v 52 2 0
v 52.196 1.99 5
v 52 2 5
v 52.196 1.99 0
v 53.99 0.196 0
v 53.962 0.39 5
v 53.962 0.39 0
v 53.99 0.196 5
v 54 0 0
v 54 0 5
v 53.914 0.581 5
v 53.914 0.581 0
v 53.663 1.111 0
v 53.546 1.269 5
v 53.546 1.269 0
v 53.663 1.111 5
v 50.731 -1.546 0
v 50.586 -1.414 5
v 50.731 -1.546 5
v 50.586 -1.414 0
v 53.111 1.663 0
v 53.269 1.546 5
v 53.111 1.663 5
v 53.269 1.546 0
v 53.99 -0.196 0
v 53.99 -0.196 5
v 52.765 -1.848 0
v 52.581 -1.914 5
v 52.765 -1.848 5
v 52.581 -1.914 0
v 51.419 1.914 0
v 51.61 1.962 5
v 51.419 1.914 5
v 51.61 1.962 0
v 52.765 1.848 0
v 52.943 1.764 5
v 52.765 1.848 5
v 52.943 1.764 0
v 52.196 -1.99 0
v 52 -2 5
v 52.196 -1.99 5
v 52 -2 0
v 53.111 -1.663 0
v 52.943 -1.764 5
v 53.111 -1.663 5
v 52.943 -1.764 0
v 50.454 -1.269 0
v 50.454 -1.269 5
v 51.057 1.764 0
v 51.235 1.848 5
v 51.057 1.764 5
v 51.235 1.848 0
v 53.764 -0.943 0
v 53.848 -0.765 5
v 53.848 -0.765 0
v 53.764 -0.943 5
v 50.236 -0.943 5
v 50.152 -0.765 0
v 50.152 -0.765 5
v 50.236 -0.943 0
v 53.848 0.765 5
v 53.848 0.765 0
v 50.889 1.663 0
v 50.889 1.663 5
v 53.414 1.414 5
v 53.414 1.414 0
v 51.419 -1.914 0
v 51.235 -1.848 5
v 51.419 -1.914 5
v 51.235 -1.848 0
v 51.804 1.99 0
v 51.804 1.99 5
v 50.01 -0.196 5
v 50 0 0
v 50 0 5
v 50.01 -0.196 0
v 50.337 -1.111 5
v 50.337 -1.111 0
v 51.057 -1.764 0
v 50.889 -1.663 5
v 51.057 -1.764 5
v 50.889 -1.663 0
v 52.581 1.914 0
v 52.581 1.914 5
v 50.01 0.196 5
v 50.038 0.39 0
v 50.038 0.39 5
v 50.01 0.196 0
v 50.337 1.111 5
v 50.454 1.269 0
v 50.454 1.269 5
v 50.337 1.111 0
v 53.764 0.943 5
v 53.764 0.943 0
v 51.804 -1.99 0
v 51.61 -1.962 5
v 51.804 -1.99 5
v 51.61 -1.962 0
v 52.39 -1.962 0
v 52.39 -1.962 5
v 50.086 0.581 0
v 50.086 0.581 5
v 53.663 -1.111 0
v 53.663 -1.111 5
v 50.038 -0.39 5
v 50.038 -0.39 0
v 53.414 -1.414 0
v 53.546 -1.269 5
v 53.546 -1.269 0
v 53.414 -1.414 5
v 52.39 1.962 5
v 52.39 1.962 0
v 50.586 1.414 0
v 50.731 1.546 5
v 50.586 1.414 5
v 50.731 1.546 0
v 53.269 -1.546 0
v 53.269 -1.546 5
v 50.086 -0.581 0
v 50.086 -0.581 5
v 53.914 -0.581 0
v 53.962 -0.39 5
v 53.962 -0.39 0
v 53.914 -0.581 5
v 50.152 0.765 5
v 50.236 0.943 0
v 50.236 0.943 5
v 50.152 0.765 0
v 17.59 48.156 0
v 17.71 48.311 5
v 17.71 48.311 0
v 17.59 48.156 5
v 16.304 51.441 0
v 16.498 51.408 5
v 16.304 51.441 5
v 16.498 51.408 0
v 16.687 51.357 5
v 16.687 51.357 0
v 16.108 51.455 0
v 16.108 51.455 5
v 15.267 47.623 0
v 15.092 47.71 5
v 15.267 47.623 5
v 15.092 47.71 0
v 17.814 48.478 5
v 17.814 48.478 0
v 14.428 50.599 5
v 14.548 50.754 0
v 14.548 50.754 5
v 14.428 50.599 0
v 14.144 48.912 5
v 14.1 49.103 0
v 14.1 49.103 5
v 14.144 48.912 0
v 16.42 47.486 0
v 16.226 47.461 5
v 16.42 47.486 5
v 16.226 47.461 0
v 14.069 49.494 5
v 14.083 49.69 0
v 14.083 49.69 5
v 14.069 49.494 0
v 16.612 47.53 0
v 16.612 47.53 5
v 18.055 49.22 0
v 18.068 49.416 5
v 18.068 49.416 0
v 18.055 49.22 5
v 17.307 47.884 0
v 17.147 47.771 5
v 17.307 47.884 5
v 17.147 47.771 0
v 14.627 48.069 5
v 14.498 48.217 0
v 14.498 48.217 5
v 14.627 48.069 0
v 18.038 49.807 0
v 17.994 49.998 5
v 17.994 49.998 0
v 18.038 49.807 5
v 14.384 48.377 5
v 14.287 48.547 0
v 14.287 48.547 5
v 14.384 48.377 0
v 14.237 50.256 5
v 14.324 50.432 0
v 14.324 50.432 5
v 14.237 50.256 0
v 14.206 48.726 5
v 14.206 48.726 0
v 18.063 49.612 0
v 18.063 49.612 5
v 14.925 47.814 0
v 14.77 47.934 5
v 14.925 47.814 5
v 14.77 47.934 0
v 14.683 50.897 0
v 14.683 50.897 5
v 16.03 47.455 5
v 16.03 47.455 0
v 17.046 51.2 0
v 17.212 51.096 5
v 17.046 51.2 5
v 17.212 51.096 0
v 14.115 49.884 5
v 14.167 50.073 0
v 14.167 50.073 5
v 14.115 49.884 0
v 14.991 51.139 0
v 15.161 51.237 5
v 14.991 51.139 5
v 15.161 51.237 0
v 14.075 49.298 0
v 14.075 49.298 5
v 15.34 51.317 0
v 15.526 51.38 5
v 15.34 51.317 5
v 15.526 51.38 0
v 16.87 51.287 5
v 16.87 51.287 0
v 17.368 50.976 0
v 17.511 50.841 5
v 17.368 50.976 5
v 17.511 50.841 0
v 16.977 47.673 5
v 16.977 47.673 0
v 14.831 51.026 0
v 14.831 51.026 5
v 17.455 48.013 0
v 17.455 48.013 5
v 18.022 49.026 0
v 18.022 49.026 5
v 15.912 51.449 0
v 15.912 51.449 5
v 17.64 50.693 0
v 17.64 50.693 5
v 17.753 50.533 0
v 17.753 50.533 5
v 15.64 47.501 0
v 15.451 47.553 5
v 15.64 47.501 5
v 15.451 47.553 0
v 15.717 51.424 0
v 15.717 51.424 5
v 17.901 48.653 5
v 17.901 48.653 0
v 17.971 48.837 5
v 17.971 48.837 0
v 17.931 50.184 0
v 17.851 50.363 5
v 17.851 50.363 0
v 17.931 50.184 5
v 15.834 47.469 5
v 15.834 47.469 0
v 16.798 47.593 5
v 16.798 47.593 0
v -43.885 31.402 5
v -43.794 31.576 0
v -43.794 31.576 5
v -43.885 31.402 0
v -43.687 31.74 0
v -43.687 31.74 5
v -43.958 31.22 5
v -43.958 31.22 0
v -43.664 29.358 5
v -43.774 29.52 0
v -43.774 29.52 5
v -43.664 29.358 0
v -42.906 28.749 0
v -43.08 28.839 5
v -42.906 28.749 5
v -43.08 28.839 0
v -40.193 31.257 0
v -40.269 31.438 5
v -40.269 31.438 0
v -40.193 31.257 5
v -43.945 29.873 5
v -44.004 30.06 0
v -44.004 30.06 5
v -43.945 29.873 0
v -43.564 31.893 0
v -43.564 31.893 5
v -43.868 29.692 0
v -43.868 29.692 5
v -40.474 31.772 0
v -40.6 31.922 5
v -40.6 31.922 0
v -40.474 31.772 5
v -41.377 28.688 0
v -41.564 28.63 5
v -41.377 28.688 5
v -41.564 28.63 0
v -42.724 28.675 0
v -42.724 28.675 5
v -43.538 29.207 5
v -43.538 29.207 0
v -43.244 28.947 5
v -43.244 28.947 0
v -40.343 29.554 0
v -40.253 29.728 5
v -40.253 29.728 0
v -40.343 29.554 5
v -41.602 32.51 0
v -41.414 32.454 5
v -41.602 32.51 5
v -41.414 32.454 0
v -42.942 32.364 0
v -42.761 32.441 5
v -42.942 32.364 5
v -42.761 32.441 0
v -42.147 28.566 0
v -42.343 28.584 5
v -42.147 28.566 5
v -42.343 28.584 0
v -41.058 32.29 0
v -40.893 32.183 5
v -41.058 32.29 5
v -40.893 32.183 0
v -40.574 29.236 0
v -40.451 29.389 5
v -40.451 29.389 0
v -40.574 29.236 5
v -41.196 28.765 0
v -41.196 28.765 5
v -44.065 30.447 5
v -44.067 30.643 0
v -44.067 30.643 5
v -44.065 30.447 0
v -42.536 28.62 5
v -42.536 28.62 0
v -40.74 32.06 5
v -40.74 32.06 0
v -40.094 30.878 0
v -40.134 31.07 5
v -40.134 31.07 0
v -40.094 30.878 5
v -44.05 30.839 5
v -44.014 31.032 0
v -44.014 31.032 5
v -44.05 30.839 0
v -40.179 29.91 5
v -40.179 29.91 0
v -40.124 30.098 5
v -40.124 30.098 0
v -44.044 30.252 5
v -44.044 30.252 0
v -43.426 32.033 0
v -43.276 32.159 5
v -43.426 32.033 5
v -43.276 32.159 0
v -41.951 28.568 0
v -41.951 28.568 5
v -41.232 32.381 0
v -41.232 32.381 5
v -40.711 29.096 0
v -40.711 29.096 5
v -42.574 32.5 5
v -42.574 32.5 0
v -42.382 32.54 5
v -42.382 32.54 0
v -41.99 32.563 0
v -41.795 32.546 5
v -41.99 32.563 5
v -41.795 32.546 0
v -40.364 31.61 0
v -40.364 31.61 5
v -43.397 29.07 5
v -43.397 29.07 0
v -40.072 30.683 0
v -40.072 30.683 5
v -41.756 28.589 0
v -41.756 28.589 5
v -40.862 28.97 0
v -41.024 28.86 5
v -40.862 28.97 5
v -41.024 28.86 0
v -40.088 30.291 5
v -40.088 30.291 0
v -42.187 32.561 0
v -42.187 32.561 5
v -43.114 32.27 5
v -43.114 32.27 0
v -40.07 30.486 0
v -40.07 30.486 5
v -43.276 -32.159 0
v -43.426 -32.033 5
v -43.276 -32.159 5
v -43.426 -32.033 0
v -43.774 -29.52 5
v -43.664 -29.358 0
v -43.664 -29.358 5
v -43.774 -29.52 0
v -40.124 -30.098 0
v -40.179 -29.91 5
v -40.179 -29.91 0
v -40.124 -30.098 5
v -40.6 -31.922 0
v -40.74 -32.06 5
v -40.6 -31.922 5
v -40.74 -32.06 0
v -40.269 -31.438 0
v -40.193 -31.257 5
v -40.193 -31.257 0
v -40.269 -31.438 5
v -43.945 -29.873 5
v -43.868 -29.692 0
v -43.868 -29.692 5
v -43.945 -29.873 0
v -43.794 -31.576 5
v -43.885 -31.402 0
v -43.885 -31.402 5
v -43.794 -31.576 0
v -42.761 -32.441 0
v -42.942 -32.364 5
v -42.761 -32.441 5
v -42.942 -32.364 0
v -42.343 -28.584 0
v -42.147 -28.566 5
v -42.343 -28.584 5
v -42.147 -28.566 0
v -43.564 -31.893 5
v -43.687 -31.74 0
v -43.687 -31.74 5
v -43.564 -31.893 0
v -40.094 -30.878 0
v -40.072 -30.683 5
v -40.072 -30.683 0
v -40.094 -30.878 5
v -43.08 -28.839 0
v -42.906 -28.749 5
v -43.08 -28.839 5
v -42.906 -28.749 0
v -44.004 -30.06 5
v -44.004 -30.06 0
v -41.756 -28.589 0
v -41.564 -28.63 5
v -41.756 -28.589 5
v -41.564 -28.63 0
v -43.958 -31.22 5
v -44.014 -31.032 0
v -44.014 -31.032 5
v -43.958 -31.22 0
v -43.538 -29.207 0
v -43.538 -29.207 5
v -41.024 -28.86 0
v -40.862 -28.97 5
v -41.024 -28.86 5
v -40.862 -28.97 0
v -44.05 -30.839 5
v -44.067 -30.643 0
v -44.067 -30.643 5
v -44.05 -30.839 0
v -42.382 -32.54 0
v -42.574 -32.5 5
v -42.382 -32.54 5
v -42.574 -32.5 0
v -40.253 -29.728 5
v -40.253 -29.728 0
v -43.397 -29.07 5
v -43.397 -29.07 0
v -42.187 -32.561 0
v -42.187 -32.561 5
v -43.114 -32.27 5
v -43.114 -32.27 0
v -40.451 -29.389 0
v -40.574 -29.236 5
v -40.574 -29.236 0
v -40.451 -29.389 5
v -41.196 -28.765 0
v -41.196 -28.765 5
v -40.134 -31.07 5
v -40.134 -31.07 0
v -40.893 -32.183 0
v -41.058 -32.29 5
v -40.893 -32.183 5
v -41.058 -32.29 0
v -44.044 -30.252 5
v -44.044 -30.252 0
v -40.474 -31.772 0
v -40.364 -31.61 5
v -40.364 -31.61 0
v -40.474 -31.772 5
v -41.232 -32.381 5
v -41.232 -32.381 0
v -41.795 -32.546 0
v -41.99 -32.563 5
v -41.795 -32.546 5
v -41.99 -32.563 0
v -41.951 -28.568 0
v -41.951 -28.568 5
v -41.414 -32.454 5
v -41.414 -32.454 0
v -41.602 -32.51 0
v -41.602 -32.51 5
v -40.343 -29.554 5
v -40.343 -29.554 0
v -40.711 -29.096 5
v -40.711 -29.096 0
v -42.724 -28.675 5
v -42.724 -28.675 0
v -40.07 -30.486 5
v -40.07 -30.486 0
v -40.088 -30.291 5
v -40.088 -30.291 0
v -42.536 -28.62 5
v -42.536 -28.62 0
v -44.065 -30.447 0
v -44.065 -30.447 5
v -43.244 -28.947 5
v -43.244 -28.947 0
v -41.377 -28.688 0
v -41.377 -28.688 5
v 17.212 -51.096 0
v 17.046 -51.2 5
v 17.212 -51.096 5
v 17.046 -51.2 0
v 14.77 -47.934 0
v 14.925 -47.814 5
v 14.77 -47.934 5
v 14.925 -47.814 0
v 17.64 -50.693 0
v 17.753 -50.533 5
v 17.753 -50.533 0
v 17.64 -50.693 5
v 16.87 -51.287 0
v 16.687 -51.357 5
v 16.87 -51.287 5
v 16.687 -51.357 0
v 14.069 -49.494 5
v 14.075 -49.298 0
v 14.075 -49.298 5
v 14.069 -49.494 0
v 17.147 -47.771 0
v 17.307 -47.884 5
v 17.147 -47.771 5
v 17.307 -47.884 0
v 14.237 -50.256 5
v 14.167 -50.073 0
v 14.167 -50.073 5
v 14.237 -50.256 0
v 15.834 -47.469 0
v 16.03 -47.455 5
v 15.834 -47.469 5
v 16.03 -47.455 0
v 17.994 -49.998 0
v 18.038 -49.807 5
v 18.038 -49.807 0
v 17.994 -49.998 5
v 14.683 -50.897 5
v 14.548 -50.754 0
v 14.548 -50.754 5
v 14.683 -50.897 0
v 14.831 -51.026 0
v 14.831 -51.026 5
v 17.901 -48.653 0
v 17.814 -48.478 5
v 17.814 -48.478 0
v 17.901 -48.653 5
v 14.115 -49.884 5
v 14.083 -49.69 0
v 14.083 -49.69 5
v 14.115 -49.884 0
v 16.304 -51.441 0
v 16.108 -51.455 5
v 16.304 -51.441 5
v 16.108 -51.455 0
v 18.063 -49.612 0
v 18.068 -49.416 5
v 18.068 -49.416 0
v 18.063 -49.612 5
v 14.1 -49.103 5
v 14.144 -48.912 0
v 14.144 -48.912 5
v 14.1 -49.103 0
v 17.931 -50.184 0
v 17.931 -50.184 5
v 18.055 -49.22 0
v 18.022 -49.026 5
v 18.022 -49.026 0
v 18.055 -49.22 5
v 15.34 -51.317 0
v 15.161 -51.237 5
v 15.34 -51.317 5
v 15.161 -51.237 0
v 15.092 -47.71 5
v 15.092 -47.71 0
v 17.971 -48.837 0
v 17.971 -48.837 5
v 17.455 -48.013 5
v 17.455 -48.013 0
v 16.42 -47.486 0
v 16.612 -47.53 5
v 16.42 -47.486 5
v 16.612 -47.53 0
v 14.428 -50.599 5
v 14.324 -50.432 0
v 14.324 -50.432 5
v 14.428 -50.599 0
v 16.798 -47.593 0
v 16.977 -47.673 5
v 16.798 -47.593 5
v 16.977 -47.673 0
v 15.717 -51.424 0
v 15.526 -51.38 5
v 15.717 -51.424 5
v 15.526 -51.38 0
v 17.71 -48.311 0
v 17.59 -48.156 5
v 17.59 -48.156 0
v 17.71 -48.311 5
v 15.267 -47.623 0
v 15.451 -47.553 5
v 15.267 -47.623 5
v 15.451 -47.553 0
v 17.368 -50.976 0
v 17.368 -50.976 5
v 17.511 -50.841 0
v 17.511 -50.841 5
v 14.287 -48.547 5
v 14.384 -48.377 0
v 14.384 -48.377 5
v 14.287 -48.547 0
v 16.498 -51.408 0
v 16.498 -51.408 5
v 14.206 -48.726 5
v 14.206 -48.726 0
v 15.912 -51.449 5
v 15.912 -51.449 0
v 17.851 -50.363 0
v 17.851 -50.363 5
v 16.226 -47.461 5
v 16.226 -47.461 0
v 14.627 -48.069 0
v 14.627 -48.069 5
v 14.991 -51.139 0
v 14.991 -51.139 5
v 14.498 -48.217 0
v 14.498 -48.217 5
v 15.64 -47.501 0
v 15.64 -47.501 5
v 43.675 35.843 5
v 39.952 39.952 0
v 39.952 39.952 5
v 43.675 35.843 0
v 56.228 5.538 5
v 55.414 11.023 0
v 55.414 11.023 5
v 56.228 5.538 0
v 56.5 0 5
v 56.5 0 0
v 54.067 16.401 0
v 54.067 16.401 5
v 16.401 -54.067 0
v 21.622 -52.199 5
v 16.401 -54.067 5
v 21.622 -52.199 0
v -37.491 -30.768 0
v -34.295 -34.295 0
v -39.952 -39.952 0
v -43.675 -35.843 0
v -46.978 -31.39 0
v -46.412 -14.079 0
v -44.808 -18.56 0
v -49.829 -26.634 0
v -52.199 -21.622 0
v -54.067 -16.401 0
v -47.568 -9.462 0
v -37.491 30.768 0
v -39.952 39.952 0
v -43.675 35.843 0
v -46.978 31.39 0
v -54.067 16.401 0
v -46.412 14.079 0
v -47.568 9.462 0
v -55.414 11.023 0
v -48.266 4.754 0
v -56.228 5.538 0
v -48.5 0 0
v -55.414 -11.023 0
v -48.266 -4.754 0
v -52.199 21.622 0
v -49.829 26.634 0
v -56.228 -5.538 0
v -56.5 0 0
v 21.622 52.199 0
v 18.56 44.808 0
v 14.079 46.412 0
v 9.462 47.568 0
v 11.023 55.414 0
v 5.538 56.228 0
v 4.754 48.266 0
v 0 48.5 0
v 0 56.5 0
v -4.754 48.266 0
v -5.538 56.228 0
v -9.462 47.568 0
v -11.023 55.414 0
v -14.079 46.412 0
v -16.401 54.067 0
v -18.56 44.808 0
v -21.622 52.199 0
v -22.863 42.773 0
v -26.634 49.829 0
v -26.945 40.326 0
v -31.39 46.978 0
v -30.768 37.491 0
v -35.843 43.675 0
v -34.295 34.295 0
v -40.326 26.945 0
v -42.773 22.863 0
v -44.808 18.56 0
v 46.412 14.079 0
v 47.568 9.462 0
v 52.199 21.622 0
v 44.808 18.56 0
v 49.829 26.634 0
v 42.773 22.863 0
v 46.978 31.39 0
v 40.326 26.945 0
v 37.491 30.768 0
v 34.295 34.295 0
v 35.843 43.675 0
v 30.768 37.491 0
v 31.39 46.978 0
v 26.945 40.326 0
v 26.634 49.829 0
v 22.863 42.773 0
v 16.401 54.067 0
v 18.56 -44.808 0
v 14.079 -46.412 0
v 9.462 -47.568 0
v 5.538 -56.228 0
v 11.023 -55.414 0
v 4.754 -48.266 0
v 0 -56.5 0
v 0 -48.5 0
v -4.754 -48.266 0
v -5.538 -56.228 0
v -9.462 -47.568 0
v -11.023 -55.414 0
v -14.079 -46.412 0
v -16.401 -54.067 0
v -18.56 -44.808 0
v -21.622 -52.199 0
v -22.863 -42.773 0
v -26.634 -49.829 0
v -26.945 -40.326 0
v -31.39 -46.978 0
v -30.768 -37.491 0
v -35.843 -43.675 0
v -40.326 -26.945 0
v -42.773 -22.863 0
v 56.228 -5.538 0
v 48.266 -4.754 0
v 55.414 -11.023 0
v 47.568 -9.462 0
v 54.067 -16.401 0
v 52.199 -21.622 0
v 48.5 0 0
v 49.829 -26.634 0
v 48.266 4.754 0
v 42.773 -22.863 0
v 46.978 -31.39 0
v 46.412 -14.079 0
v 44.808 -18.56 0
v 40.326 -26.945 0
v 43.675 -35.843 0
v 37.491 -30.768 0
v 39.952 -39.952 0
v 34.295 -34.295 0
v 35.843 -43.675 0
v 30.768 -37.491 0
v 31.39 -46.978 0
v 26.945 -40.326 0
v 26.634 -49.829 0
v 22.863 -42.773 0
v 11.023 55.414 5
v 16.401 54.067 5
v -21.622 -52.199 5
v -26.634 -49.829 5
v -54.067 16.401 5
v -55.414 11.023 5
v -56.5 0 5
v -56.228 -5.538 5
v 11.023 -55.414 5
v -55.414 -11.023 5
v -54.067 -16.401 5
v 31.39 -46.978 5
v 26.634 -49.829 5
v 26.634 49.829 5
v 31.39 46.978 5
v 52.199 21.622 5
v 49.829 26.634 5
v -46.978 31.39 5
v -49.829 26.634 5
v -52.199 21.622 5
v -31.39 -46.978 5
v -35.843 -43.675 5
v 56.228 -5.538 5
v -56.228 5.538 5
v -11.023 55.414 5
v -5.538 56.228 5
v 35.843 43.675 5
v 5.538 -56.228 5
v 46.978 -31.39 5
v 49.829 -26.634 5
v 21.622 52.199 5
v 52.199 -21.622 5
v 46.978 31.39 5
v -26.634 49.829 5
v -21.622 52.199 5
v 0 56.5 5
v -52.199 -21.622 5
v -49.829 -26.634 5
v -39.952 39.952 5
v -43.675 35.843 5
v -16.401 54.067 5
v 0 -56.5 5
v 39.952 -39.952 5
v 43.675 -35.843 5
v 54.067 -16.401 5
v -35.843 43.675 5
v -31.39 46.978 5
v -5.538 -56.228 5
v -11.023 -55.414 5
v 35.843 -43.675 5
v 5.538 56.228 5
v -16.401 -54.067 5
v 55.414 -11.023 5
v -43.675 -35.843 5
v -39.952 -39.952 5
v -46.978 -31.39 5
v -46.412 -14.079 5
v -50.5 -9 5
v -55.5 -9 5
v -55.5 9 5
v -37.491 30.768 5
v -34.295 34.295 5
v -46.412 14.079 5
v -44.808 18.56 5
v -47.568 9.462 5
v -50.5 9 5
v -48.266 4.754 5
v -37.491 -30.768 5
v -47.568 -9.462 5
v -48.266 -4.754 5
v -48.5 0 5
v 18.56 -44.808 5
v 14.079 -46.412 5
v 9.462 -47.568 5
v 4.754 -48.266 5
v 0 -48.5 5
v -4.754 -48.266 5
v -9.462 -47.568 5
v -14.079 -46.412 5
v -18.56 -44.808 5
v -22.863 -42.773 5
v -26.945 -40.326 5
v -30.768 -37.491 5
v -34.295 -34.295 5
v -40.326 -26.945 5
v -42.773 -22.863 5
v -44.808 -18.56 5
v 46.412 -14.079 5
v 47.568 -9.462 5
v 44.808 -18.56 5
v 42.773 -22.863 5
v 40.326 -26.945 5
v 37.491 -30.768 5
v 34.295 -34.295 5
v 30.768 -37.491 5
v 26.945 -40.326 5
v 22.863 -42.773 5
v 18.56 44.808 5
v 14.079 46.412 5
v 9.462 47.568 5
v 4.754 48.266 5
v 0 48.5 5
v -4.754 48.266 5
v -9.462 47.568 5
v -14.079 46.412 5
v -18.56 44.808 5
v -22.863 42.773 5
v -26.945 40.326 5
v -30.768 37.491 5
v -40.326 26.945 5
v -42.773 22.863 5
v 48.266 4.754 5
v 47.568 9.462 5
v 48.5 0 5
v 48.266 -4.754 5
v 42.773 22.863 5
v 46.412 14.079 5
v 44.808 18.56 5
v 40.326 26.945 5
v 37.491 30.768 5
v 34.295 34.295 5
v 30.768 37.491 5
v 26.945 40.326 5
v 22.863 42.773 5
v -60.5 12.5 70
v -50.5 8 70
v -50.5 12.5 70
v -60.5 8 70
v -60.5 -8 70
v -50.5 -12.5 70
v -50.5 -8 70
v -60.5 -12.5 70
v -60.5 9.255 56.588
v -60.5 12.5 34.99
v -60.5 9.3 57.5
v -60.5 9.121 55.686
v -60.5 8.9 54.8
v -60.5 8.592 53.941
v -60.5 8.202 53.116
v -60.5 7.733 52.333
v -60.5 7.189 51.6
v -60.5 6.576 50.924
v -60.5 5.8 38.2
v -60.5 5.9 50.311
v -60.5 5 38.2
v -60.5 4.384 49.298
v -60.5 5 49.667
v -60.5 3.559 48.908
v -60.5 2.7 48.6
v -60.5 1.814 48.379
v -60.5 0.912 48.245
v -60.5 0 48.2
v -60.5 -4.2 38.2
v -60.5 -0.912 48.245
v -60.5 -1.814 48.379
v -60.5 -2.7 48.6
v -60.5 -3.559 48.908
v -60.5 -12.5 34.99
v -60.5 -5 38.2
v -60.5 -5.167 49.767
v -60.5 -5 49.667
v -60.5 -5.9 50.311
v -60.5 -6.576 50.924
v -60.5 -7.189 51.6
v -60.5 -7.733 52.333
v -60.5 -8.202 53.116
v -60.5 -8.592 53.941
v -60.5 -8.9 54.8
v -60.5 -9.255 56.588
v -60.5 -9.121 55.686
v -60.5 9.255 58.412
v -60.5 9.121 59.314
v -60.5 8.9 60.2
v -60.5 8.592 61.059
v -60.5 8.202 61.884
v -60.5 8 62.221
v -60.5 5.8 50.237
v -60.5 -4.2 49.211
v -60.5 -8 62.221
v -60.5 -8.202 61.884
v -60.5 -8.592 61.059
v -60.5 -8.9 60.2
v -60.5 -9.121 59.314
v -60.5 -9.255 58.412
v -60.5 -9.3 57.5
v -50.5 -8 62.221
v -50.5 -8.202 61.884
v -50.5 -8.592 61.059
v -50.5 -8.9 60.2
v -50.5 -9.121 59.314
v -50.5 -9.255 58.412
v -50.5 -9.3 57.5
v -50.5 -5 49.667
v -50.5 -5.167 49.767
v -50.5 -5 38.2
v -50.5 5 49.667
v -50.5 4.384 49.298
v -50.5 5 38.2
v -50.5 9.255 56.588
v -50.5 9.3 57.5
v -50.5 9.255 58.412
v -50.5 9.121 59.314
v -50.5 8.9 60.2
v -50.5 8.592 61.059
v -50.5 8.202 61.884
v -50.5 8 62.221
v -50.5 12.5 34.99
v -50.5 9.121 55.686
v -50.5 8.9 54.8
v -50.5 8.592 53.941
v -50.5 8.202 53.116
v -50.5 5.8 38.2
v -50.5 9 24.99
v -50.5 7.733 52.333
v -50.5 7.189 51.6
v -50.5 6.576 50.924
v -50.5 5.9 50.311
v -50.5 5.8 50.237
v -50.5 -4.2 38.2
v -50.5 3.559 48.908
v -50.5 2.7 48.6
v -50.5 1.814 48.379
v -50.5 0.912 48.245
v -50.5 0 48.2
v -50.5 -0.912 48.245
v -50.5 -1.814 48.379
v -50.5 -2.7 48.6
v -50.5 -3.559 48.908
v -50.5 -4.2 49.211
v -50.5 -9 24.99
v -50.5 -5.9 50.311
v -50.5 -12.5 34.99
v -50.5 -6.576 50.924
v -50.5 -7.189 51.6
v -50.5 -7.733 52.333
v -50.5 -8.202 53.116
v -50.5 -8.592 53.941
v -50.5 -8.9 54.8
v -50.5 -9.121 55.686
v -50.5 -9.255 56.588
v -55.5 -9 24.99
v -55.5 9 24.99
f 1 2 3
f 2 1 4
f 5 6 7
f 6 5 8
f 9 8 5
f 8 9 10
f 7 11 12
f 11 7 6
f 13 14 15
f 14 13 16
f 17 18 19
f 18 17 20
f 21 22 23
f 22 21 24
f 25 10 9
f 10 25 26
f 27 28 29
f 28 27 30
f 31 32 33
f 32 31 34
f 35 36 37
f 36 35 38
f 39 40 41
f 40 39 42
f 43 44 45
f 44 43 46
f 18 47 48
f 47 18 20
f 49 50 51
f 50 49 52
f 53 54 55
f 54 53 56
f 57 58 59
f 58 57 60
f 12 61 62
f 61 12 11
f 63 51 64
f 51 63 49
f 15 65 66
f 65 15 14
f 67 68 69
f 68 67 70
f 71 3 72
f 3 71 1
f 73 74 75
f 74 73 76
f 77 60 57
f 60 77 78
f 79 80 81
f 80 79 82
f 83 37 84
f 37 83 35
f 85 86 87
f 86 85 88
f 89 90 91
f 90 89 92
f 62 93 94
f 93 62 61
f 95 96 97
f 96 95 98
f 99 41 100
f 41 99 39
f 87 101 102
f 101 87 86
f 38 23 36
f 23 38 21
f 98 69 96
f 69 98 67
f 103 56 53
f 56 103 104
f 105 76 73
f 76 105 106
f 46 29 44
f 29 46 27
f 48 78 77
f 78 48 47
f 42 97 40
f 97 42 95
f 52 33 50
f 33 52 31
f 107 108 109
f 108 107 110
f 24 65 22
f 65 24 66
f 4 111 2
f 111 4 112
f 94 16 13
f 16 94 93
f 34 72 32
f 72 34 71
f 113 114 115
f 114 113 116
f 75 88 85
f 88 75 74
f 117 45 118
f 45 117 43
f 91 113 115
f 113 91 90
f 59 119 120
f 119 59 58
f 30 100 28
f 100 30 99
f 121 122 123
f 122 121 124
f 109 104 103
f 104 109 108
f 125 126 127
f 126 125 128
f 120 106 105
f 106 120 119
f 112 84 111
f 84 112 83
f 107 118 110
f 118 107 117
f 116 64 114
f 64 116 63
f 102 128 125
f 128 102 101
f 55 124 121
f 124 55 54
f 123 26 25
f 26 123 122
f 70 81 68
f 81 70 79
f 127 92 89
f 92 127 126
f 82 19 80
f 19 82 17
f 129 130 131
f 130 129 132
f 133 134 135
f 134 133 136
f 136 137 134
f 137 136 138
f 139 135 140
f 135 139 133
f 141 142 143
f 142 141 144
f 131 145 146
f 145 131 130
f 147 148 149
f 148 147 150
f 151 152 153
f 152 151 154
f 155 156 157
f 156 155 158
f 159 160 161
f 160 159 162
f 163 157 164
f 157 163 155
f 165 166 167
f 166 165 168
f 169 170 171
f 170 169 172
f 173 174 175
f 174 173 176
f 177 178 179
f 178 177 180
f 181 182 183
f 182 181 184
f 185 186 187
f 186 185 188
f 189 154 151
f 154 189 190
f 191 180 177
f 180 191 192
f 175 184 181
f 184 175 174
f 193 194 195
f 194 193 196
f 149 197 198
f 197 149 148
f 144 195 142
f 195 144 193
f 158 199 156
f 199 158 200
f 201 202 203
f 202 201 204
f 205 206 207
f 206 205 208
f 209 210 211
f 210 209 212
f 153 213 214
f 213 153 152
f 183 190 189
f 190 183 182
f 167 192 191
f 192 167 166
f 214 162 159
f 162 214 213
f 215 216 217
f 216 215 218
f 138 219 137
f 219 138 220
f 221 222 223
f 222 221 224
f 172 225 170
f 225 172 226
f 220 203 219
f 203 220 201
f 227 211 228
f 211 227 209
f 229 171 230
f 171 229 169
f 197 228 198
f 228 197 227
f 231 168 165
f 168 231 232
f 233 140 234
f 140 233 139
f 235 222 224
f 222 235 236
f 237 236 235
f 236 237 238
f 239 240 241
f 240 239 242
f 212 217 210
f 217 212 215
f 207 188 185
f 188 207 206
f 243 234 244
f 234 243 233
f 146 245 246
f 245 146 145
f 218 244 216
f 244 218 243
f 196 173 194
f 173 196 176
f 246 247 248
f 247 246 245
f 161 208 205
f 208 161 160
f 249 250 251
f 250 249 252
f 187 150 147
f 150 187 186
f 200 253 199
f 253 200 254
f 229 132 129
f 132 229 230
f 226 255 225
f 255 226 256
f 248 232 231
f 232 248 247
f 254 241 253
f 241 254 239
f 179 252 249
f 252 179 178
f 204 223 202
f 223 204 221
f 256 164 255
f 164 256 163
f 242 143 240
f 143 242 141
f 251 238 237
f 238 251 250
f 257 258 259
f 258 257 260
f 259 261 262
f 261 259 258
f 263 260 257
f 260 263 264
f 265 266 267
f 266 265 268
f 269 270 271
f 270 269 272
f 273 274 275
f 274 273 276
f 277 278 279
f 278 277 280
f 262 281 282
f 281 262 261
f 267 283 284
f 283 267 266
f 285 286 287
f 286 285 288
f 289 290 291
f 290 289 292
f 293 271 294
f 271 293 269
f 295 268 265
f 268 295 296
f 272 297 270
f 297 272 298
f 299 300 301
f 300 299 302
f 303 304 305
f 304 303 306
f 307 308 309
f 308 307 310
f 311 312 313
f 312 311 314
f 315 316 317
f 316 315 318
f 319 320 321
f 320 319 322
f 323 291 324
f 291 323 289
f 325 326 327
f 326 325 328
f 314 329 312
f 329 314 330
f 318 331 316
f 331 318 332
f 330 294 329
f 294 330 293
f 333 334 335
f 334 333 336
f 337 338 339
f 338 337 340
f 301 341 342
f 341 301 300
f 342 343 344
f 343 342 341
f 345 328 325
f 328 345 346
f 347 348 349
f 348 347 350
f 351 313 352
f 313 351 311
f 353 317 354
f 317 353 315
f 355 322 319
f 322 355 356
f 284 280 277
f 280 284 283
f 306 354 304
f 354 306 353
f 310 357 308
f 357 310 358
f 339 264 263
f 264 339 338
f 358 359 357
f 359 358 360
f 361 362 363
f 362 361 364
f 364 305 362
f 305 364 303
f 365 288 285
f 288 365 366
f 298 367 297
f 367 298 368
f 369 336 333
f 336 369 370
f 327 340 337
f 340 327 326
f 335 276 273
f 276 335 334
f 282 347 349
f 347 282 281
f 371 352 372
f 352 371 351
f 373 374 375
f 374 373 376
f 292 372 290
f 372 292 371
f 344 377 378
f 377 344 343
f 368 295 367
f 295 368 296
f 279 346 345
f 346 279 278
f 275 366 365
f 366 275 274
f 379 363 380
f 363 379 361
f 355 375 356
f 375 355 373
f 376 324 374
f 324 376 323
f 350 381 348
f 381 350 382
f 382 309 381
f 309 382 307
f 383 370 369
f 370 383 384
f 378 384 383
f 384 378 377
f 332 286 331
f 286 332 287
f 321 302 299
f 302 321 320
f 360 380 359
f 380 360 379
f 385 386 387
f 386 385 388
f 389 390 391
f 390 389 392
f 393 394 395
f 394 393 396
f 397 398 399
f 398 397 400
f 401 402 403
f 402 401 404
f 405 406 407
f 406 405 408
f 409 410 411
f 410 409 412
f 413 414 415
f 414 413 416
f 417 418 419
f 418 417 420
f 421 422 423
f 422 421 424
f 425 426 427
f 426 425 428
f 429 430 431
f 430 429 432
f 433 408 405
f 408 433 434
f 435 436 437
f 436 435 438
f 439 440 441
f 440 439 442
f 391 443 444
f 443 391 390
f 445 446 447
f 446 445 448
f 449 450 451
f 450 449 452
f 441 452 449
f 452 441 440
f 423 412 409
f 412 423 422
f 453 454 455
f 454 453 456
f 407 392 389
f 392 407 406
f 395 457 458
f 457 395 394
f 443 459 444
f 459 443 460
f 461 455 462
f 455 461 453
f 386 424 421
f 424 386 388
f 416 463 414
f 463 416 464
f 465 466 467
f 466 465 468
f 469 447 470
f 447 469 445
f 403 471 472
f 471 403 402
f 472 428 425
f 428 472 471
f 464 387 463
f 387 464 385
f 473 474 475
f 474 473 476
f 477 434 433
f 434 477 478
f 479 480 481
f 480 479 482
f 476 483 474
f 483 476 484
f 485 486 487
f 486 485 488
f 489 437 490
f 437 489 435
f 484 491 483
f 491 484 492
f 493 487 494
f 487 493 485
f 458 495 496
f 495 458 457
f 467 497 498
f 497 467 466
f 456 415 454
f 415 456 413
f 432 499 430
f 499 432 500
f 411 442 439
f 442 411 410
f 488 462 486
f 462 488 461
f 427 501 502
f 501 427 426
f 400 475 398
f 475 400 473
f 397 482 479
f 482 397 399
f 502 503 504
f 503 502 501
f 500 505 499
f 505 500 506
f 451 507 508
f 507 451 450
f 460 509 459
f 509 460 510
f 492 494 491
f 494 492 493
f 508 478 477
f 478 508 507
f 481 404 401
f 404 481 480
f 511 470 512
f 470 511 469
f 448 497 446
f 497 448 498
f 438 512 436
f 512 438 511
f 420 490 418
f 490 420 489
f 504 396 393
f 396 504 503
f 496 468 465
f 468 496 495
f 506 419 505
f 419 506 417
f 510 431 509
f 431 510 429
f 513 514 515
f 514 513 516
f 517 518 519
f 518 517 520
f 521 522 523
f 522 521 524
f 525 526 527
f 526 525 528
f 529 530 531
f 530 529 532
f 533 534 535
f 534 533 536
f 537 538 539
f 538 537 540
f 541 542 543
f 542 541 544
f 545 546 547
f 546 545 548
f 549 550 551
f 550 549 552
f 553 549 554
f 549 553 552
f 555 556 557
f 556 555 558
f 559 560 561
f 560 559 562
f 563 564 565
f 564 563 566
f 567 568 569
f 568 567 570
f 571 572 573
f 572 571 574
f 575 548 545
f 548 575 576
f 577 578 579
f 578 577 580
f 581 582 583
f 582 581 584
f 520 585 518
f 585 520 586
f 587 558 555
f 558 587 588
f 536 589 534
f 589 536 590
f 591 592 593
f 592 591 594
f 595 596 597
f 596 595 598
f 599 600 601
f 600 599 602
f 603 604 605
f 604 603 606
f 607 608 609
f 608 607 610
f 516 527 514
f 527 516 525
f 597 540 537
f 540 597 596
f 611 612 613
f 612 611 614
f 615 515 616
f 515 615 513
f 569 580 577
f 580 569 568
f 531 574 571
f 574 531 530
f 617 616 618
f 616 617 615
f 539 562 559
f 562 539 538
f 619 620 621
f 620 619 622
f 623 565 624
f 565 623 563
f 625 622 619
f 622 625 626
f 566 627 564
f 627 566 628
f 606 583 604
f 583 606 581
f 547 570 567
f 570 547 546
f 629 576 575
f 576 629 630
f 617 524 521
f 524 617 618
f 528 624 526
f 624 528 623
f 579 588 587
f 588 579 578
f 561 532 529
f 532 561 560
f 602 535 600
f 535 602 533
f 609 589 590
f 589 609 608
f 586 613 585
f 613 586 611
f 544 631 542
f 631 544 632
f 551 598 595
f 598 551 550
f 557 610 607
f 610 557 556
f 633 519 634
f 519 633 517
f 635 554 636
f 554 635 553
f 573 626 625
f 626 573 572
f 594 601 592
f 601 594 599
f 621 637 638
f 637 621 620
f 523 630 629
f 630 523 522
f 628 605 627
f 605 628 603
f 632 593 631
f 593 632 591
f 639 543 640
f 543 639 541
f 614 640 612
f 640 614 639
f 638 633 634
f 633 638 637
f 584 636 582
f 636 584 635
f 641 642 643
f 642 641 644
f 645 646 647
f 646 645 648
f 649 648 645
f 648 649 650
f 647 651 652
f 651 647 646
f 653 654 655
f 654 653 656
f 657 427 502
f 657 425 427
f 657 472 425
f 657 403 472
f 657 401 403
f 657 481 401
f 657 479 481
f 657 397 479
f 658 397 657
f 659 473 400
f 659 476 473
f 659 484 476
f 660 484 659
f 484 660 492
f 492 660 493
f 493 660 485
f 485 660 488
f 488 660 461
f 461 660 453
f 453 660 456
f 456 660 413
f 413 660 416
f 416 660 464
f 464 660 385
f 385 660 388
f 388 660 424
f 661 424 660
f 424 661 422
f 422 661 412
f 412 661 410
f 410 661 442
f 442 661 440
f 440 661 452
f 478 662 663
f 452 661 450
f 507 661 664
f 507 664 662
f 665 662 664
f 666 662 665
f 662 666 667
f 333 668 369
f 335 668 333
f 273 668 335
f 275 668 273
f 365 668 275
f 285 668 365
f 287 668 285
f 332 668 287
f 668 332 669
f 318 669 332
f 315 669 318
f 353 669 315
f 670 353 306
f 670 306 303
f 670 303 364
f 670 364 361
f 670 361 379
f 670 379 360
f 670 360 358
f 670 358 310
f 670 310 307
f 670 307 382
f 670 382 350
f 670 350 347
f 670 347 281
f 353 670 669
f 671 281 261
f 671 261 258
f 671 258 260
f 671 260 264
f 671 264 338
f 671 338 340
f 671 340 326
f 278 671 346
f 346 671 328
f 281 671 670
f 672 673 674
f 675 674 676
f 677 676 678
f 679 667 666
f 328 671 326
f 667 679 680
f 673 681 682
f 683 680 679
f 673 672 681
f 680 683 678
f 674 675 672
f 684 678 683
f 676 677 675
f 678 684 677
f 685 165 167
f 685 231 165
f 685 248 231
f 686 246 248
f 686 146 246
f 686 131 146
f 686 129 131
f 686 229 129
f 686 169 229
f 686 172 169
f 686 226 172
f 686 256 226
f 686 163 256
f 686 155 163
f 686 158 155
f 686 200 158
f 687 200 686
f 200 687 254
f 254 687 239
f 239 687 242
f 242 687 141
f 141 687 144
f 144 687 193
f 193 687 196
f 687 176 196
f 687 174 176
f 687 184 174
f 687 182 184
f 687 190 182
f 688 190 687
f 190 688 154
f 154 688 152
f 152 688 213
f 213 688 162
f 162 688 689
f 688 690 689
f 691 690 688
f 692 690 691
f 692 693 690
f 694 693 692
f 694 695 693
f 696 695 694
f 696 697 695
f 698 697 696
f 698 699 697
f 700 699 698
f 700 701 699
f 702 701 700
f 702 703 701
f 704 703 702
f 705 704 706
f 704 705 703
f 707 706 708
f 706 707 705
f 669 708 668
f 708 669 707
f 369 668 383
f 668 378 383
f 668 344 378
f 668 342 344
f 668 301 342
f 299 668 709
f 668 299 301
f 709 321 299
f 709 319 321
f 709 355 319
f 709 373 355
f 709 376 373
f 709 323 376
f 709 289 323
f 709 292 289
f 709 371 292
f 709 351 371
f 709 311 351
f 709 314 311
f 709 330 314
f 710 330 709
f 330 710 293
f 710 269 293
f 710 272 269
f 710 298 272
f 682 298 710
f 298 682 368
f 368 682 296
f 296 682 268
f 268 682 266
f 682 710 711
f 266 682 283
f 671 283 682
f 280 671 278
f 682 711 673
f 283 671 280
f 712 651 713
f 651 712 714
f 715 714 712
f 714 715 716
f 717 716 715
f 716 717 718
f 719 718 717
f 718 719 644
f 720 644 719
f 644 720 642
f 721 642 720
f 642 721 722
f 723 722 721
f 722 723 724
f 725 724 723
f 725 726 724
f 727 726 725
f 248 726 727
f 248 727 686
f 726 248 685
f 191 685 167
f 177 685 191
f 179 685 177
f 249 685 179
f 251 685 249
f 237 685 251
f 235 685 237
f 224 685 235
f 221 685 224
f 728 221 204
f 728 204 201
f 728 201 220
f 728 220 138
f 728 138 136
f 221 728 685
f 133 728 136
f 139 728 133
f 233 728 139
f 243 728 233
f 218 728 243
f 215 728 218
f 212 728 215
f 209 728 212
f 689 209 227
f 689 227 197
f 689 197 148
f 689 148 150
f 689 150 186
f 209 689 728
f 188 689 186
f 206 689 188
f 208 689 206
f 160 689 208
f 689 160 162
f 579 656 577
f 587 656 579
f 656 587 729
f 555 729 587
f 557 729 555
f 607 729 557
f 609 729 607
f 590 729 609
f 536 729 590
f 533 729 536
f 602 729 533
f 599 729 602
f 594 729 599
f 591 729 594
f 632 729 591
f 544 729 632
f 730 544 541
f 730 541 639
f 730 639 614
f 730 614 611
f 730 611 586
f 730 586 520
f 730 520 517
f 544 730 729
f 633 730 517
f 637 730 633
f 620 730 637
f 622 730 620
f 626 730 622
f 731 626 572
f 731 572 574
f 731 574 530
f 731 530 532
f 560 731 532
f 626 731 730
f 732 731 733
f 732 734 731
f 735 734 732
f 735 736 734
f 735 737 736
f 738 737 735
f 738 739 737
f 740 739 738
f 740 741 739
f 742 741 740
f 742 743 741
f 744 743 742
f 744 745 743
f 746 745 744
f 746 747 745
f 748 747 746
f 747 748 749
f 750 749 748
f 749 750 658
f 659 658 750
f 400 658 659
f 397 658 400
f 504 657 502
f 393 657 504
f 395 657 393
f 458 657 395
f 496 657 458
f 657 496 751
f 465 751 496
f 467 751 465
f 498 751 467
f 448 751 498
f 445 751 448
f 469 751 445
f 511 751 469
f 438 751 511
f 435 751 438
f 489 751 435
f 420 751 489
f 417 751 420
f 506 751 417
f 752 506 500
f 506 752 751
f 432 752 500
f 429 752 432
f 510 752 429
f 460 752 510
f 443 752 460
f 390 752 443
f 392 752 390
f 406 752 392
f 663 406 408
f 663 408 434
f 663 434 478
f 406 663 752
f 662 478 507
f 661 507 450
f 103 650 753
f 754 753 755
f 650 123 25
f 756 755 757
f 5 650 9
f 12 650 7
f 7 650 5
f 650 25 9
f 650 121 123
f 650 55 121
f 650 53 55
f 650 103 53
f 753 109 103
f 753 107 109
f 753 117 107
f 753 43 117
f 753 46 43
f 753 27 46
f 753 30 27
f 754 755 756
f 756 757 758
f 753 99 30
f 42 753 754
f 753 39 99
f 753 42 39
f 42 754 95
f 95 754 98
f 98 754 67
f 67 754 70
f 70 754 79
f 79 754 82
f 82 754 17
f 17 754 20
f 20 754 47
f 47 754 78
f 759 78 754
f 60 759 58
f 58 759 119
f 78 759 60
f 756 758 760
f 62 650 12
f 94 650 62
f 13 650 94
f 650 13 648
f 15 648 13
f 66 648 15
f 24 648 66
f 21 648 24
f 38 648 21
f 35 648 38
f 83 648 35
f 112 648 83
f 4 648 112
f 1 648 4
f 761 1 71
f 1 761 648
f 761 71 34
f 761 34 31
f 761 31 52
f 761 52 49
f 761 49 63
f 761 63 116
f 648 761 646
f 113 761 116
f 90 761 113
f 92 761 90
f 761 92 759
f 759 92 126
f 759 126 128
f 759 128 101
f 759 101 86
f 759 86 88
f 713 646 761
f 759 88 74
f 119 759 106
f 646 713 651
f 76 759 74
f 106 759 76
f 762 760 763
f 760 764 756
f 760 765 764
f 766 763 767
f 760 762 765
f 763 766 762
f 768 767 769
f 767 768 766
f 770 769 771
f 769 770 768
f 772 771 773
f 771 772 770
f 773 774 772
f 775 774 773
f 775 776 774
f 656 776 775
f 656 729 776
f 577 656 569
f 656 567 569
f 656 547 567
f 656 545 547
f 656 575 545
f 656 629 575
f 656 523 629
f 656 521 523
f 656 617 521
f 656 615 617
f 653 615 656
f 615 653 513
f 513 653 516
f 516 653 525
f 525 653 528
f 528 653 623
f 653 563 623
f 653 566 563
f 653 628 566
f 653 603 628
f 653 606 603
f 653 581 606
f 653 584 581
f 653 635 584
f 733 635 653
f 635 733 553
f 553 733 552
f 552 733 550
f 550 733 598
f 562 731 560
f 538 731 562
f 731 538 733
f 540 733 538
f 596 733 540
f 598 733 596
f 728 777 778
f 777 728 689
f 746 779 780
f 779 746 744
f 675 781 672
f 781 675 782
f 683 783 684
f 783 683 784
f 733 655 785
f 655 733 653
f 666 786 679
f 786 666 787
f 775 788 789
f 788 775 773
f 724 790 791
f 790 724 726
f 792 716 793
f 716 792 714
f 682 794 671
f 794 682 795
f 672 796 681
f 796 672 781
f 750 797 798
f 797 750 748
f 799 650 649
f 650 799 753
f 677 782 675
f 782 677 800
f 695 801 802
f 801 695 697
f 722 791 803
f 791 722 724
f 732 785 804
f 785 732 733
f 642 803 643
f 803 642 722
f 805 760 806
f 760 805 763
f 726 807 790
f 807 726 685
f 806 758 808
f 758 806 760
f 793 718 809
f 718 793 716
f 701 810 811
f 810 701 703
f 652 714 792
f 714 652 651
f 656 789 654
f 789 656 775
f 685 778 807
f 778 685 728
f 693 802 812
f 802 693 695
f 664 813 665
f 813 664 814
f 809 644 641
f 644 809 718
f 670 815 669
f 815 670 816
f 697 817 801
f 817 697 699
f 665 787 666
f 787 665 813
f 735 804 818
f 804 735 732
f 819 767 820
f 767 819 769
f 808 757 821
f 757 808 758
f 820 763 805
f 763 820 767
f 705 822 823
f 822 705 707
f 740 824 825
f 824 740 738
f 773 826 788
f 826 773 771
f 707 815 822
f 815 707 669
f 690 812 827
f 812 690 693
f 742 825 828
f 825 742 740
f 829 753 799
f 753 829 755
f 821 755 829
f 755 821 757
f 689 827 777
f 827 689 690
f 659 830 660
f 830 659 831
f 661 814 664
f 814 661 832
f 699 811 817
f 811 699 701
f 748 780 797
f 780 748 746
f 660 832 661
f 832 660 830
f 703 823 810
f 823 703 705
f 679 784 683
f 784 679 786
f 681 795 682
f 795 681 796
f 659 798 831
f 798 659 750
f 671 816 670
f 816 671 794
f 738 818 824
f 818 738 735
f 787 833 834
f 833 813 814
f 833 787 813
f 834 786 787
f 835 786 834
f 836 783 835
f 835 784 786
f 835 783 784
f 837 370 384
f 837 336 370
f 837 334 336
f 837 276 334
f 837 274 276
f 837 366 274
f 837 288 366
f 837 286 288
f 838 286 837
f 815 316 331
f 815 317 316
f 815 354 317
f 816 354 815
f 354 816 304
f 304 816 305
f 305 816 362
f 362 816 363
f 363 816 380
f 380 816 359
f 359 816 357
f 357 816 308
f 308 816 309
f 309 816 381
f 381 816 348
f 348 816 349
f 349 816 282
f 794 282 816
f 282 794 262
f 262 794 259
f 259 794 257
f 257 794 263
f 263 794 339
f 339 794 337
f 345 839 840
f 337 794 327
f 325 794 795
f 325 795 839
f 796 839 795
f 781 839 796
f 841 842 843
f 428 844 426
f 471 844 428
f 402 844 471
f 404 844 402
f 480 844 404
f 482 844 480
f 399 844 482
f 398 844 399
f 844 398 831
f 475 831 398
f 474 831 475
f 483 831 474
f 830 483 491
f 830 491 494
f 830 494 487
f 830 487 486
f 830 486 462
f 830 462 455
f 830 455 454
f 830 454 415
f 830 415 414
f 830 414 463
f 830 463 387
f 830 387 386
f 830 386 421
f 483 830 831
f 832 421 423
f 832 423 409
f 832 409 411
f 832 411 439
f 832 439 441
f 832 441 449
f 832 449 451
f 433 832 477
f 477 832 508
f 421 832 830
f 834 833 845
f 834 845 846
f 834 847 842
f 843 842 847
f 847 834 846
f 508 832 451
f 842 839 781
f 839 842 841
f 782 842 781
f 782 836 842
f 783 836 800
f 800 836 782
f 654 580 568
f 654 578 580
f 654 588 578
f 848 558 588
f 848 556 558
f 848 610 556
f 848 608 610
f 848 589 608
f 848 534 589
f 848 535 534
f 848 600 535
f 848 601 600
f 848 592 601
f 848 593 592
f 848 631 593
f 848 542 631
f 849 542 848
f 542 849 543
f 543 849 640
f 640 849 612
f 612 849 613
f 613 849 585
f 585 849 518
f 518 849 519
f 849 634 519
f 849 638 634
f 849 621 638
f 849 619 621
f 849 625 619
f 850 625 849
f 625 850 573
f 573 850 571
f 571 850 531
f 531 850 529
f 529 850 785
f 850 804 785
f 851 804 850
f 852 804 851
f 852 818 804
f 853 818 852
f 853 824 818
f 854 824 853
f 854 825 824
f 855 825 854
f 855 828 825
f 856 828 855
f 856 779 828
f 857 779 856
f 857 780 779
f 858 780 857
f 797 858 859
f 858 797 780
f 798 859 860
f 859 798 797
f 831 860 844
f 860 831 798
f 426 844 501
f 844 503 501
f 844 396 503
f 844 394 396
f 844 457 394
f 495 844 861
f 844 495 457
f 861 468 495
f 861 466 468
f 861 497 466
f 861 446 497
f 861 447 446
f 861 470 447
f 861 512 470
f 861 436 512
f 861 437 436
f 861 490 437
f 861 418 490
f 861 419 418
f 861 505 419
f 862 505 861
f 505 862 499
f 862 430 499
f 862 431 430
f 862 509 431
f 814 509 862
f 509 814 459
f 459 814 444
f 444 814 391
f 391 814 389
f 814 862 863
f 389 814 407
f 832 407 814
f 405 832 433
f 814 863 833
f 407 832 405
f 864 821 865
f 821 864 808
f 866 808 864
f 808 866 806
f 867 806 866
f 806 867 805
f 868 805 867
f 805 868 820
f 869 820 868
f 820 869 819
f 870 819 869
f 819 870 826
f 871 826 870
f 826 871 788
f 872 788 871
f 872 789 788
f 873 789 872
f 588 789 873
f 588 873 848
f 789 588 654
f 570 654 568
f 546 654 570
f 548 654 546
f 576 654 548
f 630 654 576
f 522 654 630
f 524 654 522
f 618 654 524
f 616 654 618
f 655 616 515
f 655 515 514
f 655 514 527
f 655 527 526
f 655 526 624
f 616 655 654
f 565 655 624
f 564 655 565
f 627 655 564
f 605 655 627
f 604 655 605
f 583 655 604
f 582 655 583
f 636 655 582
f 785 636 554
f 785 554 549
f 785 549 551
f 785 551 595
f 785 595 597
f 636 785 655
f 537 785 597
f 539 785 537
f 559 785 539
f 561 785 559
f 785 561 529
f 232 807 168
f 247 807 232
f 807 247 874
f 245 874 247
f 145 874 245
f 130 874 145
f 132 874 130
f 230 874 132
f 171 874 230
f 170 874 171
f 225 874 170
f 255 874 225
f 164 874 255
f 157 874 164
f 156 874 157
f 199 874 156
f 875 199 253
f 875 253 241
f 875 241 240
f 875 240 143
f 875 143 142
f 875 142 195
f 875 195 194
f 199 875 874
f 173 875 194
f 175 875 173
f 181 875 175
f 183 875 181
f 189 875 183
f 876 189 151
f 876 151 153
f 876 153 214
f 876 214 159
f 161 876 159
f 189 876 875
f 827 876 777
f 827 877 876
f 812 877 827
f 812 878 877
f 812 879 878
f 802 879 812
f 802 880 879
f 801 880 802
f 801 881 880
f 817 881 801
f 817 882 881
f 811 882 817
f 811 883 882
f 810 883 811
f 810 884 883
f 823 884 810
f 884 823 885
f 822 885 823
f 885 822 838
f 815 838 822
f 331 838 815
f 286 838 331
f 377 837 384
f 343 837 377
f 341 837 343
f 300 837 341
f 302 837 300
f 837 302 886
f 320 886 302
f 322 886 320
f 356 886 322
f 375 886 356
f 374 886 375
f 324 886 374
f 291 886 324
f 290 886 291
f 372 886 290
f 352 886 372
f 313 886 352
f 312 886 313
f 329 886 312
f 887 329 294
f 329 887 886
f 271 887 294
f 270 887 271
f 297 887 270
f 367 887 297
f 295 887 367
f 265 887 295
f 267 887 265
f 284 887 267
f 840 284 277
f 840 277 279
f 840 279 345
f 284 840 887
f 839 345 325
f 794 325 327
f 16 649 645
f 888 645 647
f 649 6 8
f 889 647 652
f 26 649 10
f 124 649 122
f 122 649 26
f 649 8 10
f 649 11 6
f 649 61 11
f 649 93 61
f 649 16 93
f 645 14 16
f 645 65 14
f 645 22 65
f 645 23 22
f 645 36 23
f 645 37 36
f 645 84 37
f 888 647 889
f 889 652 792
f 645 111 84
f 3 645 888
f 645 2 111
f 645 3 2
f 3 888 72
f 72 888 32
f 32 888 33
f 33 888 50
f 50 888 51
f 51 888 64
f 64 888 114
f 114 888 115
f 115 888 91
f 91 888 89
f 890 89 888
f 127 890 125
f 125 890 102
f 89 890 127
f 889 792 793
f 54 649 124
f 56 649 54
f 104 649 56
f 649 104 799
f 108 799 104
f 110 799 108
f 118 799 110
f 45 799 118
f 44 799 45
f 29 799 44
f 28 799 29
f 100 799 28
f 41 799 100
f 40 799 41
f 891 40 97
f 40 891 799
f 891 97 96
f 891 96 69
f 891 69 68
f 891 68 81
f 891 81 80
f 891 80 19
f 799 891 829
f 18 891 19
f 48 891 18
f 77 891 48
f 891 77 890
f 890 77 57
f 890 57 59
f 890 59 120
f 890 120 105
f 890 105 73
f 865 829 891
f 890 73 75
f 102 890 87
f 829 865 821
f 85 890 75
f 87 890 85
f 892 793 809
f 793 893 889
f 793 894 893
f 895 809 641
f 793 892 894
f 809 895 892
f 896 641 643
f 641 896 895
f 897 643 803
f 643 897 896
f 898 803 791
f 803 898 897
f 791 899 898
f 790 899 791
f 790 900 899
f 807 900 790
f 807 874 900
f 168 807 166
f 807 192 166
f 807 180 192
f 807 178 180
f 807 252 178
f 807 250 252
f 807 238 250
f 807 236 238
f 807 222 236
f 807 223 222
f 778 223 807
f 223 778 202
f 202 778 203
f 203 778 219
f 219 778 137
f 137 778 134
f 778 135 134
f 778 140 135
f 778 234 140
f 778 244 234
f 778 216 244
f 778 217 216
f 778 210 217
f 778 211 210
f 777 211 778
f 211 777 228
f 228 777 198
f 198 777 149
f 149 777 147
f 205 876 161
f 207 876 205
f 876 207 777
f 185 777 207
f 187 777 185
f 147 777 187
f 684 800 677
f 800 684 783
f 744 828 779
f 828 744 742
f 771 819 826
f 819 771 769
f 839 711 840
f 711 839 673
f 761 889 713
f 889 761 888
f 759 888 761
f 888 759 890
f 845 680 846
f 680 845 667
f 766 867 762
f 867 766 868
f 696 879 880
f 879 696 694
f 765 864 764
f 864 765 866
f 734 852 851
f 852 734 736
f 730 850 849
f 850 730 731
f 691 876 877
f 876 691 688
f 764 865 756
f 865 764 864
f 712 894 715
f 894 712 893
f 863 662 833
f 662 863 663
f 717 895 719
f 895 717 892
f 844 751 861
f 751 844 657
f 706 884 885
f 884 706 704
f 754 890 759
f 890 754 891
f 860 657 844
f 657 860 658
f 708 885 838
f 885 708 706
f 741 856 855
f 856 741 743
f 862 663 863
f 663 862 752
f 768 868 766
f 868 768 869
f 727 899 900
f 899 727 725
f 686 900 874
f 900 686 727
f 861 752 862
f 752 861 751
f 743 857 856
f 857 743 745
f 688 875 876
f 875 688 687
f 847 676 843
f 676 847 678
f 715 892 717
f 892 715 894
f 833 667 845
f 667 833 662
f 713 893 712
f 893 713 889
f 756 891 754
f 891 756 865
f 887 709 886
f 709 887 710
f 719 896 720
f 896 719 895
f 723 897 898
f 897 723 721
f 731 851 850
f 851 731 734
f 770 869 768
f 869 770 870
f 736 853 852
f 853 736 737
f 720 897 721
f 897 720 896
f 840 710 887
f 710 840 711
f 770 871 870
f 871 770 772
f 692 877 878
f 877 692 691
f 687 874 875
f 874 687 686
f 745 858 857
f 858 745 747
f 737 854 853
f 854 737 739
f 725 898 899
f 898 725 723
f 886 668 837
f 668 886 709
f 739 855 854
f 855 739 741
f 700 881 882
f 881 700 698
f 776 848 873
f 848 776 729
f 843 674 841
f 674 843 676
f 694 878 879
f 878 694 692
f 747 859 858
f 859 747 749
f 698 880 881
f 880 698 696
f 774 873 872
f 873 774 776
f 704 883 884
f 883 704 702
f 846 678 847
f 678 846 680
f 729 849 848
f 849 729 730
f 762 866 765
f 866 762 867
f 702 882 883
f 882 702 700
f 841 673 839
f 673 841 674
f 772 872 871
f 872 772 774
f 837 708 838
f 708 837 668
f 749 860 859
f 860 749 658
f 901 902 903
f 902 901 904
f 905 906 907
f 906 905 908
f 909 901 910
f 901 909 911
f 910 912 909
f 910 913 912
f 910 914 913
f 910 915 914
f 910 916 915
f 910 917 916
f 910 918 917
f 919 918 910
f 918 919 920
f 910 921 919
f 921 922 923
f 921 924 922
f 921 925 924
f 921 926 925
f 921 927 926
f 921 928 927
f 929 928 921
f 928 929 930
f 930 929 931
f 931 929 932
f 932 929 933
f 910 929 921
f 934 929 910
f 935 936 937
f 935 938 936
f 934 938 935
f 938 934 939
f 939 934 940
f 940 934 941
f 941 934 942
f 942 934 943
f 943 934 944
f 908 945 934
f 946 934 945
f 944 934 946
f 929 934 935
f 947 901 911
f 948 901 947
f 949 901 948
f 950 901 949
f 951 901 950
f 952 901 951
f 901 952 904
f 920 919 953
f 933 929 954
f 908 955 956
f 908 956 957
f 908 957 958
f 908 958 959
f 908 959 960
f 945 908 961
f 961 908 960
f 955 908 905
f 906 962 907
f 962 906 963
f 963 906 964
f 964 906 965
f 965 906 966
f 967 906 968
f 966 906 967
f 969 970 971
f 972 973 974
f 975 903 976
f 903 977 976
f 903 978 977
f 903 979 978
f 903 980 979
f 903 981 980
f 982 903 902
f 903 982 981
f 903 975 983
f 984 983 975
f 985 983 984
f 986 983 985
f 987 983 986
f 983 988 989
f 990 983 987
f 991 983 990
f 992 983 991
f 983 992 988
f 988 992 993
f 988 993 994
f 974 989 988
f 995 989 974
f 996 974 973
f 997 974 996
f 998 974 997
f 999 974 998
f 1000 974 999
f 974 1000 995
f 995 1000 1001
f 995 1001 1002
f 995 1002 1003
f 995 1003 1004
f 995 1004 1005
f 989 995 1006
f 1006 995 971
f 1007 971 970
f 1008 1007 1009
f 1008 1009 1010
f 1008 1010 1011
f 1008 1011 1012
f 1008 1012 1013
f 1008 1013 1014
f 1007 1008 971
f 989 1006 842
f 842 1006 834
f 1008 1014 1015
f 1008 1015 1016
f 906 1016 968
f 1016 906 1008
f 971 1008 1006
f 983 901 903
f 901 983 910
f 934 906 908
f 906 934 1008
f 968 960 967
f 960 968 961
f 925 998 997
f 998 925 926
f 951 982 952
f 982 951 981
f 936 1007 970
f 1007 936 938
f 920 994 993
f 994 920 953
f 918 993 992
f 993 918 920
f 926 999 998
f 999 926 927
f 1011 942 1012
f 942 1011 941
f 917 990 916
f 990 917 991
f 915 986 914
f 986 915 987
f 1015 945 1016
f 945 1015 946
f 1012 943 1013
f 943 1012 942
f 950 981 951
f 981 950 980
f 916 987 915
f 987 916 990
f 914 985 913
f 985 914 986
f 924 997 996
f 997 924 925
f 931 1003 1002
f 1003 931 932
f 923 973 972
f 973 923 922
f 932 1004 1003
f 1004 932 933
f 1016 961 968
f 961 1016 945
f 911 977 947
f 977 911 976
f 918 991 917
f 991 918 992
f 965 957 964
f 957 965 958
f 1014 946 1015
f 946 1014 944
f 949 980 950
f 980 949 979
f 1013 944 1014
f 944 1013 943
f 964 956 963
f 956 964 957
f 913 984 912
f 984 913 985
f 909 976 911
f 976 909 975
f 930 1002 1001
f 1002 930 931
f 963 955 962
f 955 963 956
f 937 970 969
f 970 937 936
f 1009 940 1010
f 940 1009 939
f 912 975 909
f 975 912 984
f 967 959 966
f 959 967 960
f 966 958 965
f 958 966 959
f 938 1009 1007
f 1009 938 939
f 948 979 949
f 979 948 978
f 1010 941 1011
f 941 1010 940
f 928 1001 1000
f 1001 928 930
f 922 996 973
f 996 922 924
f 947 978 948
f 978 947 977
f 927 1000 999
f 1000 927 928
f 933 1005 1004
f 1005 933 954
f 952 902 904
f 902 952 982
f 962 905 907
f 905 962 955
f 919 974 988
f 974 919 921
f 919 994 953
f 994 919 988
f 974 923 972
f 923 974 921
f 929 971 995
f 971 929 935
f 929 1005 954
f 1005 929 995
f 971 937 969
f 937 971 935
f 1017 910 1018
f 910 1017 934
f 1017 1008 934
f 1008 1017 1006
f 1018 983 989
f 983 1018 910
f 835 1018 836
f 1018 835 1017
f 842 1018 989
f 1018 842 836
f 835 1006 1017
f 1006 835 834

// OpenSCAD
$fn = 64;
epsilon = 0.01;

module popFilterClip(clipParms)
{
    innerRadius = clipParms[0];
    thickness = clipParms[1];
    width = clipParms[2];
    entranceWidth = clipParms[3];
    bufferLength = clipParms[4];
    cutWidth = clipParms[5];
    cutLength = clipParms[6];
    cutSpread = clipParms[7];
    
    translate([(width/2) + bufferLength, 0, 0])    
    difference()
    {
        union()
        {
            difference()
            {
                translate([-width/2, -width/2, 0]) 
                    cube([width, width, thickness]);
                translate([0, 0, -epsilon])
                    cylinder(r = innerRadius, h = thickness + (2*epsilon));
                translate([0, -entranceWidth/2, -epsilon])
                    cube([(width/2) + epsilon , entranceWidth, thickness + (2*epsilon)]);
            }
            translate([-(width/2) - bufferLength, -width/2, 0])
                cube([bufferLength, width, thickness]);
        }
        // cuts for flexibility
        translate([-(innerRadius+cutLength), cutSpread/2, -epsilon])
            cube([innerRadius+cutLength, cutWidth, thickness + (2*epsilon)]);
        translate([-(innerRadius+cutLength), -cutSpread/2, -epsilon])
            cube([innerRadius+cutLength, cutWidth, thickness + (2*epsilon)]);
    }
}

module popFilterClipWithBridgeRamp(clipParms, bridgeParms)
{
    clipThickness = clipParms[1];
    clipWidth = clipParms[2];
    clipBufferLength = clipParms[4];
    rampThickness = clipParms[8];
    
    bridgeWidth = bridgeParms[0];
    bridgeThickness = bridgeParms[1];
    bridgeLength = bridgeParms[2];
    
    popFilterClip(clipParms);
    
    // ramp between clip and bridge
    hull()
    {
        translate([0, -clipWidth/2, 0])
            rotate([0, -90, 0])
            cube([clipThickness, clipWidth, epsilon]);
        translate([-rampThickness, -bridgeWidth/2, 0])
            rotate([0, -90, 0])
            cube([bridgeThickness, bridgeWidth, epsilon]);
    }
}

module popFilterBase(baseParms, baseHoleParms)
{
    baseRadius = baseParms[0];
    baseHeight = baseParms[1];
    baseWallThickness = baseParms[2];
    
    holeRadius = baseHoleParms[0];
    holeDistance = baseHoleParms[1];
    numHoles = baseHoleParms[2];
    holeDegreeOffset = baseHoleParms[3];
    
    difference()
    {
        cylinder(r = baseRadius, h = baseHeight);
        translate([0, 0, -epsilon])
            cylinder(r = baseRadius - baseWallThickness, h = baseHeight + (2*epsilon));
        for(i = [0 : numHoles]) 
        {
            rotate([0, 0, (i * (360 / numHoles)) + holeDegreeOffset])
                translate([holeDistance, 0 , -epsilon])
                cylinder(r = holeRadius, h = baseHeight + (2*epsilon));
        }
    }
}

module popFilter(baseParms, baseHoleParms, bridgeParms, clipParms)
{
    baseHeight = baseParms[1];
    
    bridgeWidth = bridgeParms[0];
    bridgeThickness = bridgeParms[1];
    bridgeLength = bridgeParms[2];
    bridgeDistFromCentre = bridgeParms[3];
    
    popFilterBase(baseParms, baseHoleParms);

    translate([-bridgeDistFromCentre, -bridgeWidth/2, baseHeight])
    {
        cube([bridgeThickness, bridgeWidth, bridgeLength]);
    }
    
    translate([-(bridgeDistFromCentre-bridgeThickness), 0, baseHeight + bridgeLength])
        rotate([0, -90, 0])
        popFilterClipWithBridgeRamp(clipParms, bridgeParms);
}

baseRadius = 56.5;
baseHeight = 5;
baseWallThickness = 8;

holeRadius = 2;
holeDistance = 52;
numHoles = 5;
holeDegreeOffset = 0;

bridgeWidth = 18;
bridgeThickness = 5;
bridgeLength = 30;
bridgeDistFromCentre = 55.5;
rampThickness = 10;

clipInnerRadius = 9.3;
clipThickness = 10;
clipWidth = 25;
clipEntranceWidth = 16;
clipBufferLength = 10;
clipCutWidth = 0.8;
clipCutLength = 10;
clipCutSpread = 10;

baseParms = [baseRadius, baseHeight, baseWallThickness];
baseHoleParms = [holeRadius, holeDistance, numHoles, holeDegreeOffset];
bridgeParms = [bridgeWidth, bridgeThickness, bridgeLength, bridgeDistFromCentre];
clipParms = [clipInnerRadius, clipThickness, clipWidth, clipEntranceWidth, clipBufferLength, clipCutWidth, clipCutLength, clipCutSpread, rampThickness];

popFilter(baseParms, baseHoleParms, bridgeParms, clipParms);
